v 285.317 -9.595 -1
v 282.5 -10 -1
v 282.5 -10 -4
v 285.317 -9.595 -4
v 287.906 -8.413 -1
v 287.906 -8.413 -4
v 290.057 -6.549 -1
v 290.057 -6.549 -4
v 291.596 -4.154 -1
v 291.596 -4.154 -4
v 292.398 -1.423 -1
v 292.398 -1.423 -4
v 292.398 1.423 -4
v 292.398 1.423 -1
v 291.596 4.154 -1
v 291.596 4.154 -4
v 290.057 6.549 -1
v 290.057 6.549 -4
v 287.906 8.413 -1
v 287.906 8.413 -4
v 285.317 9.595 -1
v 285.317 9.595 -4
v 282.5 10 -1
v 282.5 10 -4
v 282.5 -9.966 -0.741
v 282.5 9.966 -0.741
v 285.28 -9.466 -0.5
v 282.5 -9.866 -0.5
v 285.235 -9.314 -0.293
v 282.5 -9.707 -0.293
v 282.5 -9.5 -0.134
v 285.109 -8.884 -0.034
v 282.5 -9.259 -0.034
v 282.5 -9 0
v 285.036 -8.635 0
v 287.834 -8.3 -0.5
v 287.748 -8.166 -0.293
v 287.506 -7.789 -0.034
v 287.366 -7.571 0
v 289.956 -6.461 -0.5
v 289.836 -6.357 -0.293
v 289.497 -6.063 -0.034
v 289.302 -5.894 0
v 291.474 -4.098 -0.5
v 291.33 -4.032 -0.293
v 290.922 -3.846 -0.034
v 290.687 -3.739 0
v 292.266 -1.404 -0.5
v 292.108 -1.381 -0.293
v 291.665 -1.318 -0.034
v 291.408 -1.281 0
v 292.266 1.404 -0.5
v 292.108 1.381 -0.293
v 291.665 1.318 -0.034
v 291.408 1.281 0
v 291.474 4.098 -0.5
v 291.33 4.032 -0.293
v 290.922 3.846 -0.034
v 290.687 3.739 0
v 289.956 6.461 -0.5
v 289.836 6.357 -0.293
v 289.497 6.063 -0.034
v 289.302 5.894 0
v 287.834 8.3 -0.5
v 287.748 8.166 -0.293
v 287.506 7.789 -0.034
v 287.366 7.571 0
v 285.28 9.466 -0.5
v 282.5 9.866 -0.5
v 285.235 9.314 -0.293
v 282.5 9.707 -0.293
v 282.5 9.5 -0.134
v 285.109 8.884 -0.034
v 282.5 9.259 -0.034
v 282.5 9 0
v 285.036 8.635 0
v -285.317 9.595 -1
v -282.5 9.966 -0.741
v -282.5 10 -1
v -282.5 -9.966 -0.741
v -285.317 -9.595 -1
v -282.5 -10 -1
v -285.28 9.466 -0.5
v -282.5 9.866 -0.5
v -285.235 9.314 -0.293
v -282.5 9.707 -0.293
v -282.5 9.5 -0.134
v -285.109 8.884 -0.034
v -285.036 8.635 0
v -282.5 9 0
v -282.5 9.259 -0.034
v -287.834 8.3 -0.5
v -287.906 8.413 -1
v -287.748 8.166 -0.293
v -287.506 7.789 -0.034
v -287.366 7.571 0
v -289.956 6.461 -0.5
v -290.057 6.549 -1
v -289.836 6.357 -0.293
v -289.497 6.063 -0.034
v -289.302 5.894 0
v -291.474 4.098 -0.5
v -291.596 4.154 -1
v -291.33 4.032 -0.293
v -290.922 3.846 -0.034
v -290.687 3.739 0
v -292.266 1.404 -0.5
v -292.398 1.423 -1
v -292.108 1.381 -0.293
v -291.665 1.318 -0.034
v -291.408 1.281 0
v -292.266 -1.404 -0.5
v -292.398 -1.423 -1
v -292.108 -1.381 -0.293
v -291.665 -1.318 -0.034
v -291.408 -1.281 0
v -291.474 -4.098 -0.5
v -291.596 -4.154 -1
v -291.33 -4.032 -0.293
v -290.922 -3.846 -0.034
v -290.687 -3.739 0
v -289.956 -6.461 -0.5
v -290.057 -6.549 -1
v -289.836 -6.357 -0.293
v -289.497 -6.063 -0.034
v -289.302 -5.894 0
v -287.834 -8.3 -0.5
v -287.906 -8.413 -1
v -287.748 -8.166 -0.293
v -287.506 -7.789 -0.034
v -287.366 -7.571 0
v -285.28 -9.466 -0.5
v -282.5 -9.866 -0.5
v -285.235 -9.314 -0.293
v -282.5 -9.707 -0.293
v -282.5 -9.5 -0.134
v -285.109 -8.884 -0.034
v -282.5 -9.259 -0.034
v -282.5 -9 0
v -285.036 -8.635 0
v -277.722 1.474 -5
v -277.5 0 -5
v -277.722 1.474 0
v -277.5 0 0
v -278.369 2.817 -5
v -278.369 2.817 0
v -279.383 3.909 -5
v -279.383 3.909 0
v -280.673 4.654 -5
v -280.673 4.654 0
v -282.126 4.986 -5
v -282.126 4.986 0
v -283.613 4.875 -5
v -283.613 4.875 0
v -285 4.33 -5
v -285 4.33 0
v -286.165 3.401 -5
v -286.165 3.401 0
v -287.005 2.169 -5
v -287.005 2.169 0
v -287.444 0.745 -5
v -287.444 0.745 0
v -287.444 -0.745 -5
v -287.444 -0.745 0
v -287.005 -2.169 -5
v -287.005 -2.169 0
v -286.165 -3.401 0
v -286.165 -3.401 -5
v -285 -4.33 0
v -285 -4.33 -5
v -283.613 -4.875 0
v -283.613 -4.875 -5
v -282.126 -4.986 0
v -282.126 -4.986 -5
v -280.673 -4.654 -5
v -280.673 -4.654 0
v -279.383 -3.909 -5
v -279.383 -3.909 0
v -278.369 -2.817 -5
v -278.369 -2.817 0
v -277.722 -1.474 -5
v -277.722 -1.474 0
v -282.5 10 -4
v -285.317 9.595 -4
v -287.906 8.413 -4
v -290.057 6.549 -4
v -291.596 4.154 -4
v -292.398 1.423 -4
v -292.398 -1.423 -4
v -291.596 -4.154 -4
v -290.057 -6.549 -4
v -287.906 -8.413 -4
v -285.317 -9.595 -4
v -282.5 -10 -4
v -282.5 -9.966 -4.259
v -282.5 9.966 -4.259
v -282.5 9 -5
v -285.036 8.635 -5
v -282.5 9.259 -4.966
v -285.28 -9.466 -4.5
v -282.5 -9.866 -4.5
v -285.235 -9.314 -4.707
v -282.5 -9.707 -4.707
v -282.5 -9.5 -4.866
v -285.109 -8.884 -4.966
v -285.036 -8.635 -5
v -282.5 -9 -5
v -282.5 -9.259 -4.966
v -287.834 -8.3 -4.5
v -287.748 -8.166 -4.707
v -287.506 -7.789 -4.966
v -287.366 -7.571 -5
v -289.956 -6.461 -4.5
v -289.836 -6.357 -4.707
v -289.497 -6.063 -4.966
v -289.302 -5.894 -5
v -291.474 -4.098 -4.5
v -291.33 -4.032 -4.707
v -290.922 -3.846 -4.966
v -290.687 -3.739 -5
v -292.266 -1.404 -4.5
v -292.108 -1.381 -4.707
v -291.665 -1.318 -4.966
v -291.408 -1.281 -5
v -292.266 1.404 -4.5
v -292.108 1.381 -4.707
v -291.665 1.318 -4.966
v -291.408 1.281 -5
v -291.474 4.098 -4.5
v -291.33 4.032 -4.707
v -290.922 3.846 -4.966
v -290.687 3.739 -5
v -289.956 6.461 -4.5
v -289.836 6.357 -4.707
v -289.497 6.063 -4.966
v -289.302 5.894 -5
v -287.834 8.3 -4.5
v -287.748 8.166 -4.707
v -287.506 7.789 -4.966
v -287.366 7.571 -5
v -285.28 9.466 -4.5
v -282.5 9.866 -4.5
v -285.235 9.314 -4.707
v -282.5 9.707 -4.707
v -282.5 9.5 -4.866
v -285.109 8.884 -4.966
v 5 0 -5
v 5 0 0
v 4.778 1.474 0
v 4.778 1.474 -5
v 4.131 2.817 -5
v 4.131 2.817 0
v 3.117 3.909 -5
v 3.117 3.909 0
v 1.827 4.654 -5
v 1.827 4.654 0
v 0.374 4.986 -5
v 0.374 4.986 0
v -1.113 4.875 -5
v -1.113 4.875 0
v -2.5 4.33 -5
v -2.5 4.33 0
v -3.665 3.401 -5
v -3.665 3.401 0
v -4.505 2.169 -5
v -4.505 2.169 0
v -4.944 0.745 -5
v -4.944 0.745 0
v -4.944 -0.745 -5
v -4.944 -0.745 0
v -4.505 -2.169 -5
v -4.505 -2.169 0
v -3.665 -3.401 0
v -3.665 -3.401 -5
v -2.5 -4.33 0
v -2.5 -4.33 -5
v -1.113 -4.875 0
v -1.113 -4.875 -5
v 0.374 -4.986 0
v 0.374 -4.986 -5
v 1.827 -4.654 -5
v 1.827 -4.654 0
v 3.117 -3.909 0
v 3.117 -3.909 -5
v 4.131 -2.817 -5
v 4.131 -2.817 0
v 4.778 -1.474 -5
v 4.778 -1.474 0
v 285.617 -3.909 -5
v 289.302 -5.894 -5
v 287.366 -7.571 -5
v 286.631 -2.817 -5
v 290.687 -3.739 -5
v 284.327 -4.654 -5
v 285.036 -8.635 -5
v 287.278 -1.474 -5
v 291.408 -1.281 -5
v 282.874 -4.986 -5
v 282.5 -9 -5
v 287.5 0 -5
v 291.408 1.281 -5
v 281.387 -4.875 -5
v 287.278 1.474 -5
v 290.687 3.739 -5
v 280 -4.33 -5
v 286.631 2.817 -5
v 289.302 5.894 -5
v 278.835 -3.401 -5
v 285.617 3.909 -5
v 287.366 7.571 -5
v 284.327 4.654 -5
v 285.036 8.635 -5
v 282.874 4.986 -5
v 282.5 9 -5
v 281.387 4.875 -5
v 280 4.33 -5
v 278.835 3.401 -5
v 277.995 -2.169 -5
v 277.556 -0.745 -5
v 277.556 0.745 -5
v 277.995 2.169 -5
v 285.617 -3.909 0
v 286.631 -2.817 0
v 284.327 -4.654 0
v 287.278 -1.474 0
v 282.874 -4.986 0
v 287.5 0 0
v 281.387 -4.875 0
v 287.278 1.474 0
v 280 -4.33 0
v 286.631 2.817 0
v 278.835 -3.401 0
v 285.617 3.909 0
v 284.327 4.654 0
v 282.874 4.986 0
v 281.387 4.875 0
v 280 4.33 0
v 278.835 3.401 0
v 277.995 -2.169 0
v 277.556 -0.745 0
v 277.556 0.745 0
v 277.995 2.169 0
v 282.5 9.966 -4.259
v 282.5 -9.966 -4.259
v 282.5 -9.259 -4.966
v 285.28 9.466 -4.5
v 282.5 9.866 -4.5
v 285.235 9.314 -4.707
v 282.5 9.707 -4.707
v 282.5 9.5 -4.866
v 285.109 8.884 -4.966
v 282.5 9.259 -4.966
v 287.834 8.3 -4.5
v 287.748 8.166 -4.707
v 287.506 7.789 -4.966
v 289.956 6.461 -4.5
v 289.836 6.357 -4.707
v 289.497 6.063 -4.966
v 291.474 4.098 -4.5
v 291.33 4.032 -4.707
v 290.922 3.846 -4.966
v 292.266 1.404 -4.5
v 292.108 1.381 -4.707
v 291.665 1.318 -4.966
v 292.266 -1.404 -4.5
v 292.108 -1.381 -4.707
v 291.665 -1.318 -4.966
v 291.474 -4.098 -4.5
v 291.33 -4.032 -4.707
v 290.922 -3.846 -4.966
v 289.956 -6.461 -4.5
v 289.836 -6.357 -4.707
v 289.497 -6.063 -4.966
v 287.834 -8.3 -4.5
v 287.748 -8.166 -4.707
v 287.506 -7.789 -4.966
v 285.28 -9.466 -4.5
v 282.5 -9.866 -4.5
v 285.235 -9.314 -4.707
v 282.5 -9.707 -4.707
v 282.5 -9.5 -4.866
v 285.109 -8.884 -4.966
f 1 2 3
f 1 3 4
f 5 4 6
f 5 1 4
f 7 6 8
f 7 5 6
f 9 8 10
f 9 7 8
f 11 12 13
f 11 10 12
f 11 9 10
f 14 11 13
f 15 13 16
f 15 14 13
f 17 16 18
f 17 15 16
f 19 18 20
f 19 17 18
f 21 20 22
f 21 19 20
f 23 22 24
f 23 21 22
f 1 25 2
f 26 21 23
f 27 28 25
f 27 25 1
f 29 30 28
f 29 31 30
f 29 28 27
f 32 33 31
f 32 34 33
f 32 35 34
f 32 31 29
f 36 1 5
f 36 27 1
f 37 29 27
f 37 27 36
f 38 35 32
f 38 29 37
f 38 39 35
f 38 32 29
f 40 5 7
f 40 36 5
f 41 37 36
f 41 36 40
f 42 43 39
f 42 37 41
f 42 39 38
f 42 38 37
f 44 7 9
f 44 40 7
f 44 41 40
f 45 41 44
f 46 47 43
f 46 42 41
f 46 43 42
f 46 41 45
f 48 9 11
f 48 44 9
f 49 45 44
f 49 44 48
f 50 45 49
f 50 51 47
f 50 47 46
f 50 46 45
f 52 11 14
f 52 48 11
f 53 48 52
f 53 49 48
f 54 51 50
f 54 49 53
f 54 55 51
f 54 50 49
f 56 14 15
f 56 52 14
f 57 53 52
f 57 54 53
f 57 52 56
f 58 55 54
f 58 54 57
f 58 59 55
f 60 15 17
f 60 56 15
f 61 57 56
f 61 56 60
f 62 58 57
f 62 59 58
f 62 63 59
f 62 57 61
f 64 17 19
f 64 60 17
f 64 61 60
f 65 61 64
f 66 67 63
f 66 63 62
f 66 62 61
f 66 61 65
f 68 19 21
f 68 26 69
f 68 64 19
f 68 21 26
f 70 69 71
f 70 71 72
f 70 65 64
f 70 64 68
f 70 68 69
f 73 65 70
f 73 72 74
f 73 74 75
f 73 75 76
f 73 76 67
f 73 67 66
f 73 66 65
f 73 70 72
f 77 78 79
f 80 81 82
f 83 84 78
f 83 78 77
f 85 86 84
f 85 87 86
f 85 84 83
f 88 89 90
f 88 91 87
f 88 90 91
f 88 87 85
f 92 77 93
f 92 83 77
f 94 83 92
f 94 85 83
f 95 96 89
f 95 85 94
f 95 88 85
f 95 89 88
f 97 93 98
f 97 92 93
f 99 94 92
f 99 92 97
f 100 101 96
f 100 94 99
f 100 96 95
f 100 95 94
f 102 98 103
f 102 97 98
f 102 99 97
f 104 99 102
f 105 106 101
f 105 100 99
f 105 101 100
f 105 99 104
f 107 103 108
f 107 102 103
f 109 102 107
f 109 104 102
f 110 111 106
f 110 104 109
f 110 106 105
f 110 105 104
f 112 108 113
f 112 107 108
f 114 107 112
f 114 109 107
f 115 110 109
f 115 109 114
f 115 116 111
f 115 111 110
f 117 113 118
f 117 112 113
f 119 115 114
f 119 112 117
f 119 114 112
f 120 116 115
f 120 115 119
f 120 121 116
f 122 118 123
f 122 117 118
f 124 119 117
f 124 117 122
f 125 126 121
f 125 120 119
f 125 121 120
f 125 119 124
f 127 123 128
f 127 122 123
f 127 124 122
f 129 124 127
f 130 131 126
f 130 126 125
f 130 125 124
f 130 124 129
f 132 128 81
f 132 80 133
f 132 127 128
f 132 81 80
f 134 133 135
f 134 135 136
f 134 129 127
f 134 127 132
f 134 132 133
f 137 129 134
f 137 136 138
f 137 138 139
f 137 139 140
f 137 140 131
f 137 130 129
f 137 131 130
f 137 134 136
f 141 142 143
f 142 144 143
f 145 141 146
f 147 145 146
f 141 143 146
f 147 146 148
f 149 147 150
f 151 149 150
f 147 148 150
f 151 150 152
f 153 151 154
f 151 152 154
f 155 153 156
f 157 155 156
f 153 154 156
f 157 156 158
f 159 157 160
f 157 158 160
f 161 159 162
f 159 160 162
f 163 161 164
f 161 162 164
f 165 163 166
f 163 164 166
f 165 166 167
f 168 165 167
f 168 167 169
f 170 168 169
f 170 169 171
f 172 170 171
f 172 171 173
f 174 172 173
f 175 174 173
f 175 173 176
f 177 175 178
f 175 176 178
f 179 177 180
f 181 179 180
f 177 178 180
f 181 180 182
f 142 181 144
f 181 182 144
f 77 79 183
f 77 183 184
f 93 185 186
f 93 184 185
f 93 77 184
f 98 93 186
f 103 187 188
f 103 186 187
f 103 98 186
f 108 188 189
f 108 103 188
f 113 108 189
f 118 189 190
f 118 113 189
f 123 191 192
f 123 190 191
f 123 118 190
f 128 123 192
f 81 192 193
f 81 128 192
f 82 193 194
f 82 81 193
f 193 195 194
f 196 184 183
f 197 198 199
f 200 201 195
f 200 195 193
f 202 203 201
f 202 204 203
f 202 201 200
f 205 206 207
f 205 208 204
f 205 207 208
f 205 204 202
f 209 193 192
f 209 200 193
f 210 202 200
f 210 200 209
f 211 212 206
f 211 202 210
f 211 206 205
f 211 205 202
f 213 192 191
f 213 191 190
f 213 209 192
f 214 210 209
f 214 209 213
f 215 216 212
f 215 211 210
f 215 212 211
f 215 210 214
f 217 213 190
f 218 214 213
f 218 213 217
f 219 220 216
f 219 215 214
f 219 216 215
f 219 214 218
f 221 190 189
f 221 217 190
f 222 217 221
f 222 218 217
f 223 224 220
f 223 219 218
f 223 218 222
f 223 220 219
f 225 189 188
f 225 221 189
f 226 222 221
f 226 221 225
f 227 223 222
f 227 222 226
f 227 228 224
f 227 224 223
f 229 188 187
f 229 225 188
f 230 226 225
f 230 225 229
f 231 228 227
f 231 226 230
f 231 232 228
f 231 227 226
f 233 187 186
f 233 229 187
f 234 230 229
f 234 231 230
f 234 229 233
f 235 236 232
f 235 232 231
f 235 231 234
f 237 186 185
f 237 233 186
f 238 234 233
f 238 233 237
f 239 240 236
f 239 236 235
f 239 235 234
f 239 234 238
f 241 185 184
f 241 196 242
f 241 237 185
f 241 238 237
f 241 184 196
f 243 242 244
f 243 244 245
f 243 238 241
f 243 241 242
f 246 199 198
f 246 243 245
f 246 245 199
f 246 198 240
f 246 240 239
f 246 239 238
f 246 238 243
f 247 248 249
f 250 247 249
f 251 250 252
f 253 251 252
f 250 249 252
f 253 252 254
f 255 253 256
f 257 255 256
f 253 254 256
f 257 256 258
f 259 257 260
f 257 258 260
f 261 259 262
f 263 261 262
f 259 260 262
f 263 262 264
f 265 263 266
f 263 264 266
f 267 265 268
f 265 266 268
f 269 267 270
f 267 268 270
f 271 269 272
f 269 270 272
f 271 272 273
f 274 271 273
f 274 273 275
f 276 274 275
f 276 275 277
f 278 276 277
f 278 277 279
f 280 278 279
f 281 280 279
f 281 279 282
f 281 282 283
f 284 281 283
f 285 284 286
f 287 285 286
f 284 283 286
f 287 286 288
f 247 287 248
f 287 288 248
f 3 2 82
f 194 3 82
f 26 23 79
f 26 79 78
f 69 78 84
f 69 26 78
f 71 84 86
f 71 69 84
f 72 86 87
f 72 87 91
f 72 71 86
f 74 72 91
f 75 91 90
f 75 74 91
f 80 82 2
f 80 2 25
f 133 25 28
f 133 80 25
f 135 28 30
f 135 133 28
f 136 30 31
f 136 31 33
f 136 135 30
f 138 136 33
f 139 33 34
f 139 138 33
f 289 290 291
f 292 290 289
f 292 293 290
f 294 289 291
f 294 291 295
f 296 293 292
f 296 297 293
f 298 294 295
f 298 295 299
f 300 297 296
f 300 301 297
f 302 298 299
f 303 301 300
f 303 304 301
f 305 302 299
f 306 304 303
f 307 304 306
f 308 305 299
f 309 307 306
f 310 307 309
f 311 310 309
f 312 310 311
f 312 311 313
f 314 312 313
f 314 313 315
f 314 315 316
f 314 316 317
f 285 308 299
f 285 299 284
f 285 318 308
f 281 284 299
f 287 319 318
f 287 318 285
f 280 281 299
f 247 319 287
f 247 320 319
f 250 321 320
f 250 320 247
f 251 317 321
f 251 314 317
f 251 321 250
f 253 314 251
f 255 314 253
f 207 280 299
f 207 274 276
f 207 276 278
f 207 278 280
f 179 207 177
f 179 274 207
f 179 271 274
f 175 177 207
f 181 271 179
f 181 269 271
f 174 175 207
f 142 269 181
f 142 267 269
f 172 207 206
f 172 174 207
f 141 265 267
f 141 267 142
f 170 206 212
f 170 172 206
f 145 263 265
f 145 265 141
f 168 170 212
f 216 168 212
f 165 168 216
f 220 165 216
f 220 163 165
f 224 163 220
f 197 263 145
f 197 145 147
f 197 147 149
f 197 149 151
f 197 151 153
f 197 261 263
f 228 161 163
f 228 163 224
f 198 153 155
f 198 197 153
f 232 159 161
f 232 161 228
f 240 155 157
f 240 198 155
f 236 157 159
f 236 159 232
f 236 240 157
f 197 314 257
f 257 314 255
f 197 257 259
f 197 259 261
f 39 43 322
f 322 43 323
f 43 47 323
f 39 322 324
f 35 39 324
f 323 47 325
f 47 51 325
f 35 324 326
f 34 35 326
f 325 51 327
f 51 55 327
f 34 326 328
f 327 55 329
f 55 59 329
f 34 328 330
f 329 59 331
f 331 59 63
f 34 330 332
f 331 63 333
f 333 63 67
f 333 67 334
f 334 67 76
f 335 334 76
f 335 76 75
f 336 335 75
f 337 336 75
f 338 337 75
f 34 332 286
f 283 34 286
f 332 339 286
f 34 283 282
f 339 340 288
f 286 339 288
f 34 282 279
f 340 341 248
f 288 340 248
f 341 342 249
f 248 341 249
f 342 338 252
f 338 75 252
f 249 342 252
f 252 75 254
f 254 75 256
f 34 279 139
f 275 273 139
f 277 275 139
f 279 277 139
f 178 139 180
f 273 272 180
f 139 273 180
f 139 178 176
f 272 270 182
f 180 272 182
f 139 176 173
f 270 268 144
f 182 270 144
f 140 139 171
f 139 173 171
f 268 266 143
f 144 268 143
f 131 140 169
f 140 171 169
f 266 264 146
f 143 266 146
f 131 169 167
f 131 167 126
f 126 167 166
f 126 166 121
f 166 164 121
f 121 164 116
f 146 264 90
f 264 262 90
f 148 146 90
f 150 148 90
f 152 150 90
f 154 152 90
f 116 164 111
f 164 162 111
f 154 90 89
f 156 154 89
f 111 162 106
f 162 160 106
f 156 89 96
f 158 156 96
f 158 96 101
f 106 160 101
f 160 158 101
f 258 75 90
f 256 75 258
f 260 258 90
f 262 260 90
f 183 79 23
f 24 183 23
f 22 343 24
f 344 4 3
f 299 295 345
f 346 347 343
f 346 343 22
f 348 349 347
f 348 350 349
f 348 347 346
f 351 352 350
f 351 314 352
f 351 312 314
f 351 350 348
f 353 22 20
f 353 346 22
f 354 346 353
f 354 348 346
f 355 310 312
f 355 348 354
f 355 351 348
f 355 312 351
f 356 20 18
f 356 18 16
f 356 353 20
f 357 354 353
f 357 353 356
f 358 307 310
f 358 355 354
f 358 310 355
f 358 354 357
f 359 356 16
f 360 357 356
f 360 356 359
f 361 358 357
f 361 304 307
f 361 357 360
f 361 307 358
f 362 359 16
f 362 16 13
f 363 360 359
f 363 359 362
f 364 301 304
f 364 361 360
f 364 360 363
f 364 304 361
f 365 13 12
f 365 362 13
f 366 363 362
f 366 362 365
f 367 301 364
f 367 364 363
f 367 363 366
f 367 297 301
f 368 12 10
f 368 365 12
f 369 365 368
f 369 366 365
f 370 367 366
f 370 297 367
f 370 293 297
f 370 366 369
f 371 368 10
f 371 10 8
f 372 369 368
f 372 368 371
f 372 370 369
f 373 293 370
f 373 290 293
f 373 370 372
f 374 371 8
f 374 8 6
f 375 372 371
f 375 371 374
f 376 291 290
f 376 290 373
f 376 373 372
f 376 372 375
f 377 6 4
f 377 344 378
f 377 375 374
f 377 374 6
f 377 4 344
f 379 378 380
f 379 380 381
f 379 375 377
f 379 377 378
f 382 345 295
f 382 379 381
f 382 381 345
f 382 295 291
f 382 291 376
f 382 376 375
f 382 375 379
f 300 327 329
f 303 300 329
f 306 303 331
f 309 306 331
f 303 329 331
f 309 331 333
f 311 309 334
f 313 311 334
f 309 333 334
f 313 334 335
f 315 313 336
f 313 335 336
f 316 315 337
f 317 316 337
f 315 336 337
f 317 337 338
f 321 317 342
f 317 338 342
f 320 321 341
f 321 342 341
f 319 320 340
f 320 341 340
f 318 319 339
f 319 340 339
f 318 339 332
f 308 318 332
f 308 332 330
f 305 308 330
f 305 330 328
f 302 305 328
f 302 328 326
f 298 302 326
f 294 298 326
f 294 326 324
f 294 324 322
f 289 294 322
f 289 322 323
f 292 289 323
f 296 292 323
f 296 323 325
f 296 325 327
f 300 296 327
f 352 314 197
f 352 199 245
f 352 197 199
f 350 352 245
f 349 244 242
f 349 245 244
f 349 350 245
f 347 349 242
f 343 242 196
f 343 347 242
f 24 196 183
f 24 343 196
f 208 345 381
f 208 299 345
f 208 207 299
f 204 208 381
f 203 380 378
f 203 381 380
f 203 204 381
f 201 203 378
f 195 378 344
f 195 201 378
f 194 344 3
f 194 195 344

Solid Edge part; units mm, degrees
sketch "Sketch1" plane through (0, 0, 0) normal (0, 0, 1) x (1, 0, 0)
  arc A0 (-282.5, -10) -> (-282.5, 10) centre (-282.5, 0) cw
  line L0 (-282.5, 10) -> (282.5, 10)
  arc A1 (282.5, 10) -> (282.5, -10) centre (282.5, 0) cw
  line L1 (282.5, -10) -> (-282.5, -10)
  circle A2 centre (-282.5, 0) radius 5
  circle A3 centre (282.5, 0) radius 5
  circle A4 centre (0, 0) radius 5
  dimension "D1" = 565
  dimension "D2" = 20
extrude "Protrusion1" add sketch "Sketch1" against normal blind 5
fillet "Round_1" radius 1 8 edges at (0, 10, -5) (0, 10, 0) (0, -10, 0) (0, -10, -5) (-292.5, 0, 0) (-292.5, 0, -5) (292.5, 0, 0) (292.5, 0, -5)
properties material "Stainless steel"
